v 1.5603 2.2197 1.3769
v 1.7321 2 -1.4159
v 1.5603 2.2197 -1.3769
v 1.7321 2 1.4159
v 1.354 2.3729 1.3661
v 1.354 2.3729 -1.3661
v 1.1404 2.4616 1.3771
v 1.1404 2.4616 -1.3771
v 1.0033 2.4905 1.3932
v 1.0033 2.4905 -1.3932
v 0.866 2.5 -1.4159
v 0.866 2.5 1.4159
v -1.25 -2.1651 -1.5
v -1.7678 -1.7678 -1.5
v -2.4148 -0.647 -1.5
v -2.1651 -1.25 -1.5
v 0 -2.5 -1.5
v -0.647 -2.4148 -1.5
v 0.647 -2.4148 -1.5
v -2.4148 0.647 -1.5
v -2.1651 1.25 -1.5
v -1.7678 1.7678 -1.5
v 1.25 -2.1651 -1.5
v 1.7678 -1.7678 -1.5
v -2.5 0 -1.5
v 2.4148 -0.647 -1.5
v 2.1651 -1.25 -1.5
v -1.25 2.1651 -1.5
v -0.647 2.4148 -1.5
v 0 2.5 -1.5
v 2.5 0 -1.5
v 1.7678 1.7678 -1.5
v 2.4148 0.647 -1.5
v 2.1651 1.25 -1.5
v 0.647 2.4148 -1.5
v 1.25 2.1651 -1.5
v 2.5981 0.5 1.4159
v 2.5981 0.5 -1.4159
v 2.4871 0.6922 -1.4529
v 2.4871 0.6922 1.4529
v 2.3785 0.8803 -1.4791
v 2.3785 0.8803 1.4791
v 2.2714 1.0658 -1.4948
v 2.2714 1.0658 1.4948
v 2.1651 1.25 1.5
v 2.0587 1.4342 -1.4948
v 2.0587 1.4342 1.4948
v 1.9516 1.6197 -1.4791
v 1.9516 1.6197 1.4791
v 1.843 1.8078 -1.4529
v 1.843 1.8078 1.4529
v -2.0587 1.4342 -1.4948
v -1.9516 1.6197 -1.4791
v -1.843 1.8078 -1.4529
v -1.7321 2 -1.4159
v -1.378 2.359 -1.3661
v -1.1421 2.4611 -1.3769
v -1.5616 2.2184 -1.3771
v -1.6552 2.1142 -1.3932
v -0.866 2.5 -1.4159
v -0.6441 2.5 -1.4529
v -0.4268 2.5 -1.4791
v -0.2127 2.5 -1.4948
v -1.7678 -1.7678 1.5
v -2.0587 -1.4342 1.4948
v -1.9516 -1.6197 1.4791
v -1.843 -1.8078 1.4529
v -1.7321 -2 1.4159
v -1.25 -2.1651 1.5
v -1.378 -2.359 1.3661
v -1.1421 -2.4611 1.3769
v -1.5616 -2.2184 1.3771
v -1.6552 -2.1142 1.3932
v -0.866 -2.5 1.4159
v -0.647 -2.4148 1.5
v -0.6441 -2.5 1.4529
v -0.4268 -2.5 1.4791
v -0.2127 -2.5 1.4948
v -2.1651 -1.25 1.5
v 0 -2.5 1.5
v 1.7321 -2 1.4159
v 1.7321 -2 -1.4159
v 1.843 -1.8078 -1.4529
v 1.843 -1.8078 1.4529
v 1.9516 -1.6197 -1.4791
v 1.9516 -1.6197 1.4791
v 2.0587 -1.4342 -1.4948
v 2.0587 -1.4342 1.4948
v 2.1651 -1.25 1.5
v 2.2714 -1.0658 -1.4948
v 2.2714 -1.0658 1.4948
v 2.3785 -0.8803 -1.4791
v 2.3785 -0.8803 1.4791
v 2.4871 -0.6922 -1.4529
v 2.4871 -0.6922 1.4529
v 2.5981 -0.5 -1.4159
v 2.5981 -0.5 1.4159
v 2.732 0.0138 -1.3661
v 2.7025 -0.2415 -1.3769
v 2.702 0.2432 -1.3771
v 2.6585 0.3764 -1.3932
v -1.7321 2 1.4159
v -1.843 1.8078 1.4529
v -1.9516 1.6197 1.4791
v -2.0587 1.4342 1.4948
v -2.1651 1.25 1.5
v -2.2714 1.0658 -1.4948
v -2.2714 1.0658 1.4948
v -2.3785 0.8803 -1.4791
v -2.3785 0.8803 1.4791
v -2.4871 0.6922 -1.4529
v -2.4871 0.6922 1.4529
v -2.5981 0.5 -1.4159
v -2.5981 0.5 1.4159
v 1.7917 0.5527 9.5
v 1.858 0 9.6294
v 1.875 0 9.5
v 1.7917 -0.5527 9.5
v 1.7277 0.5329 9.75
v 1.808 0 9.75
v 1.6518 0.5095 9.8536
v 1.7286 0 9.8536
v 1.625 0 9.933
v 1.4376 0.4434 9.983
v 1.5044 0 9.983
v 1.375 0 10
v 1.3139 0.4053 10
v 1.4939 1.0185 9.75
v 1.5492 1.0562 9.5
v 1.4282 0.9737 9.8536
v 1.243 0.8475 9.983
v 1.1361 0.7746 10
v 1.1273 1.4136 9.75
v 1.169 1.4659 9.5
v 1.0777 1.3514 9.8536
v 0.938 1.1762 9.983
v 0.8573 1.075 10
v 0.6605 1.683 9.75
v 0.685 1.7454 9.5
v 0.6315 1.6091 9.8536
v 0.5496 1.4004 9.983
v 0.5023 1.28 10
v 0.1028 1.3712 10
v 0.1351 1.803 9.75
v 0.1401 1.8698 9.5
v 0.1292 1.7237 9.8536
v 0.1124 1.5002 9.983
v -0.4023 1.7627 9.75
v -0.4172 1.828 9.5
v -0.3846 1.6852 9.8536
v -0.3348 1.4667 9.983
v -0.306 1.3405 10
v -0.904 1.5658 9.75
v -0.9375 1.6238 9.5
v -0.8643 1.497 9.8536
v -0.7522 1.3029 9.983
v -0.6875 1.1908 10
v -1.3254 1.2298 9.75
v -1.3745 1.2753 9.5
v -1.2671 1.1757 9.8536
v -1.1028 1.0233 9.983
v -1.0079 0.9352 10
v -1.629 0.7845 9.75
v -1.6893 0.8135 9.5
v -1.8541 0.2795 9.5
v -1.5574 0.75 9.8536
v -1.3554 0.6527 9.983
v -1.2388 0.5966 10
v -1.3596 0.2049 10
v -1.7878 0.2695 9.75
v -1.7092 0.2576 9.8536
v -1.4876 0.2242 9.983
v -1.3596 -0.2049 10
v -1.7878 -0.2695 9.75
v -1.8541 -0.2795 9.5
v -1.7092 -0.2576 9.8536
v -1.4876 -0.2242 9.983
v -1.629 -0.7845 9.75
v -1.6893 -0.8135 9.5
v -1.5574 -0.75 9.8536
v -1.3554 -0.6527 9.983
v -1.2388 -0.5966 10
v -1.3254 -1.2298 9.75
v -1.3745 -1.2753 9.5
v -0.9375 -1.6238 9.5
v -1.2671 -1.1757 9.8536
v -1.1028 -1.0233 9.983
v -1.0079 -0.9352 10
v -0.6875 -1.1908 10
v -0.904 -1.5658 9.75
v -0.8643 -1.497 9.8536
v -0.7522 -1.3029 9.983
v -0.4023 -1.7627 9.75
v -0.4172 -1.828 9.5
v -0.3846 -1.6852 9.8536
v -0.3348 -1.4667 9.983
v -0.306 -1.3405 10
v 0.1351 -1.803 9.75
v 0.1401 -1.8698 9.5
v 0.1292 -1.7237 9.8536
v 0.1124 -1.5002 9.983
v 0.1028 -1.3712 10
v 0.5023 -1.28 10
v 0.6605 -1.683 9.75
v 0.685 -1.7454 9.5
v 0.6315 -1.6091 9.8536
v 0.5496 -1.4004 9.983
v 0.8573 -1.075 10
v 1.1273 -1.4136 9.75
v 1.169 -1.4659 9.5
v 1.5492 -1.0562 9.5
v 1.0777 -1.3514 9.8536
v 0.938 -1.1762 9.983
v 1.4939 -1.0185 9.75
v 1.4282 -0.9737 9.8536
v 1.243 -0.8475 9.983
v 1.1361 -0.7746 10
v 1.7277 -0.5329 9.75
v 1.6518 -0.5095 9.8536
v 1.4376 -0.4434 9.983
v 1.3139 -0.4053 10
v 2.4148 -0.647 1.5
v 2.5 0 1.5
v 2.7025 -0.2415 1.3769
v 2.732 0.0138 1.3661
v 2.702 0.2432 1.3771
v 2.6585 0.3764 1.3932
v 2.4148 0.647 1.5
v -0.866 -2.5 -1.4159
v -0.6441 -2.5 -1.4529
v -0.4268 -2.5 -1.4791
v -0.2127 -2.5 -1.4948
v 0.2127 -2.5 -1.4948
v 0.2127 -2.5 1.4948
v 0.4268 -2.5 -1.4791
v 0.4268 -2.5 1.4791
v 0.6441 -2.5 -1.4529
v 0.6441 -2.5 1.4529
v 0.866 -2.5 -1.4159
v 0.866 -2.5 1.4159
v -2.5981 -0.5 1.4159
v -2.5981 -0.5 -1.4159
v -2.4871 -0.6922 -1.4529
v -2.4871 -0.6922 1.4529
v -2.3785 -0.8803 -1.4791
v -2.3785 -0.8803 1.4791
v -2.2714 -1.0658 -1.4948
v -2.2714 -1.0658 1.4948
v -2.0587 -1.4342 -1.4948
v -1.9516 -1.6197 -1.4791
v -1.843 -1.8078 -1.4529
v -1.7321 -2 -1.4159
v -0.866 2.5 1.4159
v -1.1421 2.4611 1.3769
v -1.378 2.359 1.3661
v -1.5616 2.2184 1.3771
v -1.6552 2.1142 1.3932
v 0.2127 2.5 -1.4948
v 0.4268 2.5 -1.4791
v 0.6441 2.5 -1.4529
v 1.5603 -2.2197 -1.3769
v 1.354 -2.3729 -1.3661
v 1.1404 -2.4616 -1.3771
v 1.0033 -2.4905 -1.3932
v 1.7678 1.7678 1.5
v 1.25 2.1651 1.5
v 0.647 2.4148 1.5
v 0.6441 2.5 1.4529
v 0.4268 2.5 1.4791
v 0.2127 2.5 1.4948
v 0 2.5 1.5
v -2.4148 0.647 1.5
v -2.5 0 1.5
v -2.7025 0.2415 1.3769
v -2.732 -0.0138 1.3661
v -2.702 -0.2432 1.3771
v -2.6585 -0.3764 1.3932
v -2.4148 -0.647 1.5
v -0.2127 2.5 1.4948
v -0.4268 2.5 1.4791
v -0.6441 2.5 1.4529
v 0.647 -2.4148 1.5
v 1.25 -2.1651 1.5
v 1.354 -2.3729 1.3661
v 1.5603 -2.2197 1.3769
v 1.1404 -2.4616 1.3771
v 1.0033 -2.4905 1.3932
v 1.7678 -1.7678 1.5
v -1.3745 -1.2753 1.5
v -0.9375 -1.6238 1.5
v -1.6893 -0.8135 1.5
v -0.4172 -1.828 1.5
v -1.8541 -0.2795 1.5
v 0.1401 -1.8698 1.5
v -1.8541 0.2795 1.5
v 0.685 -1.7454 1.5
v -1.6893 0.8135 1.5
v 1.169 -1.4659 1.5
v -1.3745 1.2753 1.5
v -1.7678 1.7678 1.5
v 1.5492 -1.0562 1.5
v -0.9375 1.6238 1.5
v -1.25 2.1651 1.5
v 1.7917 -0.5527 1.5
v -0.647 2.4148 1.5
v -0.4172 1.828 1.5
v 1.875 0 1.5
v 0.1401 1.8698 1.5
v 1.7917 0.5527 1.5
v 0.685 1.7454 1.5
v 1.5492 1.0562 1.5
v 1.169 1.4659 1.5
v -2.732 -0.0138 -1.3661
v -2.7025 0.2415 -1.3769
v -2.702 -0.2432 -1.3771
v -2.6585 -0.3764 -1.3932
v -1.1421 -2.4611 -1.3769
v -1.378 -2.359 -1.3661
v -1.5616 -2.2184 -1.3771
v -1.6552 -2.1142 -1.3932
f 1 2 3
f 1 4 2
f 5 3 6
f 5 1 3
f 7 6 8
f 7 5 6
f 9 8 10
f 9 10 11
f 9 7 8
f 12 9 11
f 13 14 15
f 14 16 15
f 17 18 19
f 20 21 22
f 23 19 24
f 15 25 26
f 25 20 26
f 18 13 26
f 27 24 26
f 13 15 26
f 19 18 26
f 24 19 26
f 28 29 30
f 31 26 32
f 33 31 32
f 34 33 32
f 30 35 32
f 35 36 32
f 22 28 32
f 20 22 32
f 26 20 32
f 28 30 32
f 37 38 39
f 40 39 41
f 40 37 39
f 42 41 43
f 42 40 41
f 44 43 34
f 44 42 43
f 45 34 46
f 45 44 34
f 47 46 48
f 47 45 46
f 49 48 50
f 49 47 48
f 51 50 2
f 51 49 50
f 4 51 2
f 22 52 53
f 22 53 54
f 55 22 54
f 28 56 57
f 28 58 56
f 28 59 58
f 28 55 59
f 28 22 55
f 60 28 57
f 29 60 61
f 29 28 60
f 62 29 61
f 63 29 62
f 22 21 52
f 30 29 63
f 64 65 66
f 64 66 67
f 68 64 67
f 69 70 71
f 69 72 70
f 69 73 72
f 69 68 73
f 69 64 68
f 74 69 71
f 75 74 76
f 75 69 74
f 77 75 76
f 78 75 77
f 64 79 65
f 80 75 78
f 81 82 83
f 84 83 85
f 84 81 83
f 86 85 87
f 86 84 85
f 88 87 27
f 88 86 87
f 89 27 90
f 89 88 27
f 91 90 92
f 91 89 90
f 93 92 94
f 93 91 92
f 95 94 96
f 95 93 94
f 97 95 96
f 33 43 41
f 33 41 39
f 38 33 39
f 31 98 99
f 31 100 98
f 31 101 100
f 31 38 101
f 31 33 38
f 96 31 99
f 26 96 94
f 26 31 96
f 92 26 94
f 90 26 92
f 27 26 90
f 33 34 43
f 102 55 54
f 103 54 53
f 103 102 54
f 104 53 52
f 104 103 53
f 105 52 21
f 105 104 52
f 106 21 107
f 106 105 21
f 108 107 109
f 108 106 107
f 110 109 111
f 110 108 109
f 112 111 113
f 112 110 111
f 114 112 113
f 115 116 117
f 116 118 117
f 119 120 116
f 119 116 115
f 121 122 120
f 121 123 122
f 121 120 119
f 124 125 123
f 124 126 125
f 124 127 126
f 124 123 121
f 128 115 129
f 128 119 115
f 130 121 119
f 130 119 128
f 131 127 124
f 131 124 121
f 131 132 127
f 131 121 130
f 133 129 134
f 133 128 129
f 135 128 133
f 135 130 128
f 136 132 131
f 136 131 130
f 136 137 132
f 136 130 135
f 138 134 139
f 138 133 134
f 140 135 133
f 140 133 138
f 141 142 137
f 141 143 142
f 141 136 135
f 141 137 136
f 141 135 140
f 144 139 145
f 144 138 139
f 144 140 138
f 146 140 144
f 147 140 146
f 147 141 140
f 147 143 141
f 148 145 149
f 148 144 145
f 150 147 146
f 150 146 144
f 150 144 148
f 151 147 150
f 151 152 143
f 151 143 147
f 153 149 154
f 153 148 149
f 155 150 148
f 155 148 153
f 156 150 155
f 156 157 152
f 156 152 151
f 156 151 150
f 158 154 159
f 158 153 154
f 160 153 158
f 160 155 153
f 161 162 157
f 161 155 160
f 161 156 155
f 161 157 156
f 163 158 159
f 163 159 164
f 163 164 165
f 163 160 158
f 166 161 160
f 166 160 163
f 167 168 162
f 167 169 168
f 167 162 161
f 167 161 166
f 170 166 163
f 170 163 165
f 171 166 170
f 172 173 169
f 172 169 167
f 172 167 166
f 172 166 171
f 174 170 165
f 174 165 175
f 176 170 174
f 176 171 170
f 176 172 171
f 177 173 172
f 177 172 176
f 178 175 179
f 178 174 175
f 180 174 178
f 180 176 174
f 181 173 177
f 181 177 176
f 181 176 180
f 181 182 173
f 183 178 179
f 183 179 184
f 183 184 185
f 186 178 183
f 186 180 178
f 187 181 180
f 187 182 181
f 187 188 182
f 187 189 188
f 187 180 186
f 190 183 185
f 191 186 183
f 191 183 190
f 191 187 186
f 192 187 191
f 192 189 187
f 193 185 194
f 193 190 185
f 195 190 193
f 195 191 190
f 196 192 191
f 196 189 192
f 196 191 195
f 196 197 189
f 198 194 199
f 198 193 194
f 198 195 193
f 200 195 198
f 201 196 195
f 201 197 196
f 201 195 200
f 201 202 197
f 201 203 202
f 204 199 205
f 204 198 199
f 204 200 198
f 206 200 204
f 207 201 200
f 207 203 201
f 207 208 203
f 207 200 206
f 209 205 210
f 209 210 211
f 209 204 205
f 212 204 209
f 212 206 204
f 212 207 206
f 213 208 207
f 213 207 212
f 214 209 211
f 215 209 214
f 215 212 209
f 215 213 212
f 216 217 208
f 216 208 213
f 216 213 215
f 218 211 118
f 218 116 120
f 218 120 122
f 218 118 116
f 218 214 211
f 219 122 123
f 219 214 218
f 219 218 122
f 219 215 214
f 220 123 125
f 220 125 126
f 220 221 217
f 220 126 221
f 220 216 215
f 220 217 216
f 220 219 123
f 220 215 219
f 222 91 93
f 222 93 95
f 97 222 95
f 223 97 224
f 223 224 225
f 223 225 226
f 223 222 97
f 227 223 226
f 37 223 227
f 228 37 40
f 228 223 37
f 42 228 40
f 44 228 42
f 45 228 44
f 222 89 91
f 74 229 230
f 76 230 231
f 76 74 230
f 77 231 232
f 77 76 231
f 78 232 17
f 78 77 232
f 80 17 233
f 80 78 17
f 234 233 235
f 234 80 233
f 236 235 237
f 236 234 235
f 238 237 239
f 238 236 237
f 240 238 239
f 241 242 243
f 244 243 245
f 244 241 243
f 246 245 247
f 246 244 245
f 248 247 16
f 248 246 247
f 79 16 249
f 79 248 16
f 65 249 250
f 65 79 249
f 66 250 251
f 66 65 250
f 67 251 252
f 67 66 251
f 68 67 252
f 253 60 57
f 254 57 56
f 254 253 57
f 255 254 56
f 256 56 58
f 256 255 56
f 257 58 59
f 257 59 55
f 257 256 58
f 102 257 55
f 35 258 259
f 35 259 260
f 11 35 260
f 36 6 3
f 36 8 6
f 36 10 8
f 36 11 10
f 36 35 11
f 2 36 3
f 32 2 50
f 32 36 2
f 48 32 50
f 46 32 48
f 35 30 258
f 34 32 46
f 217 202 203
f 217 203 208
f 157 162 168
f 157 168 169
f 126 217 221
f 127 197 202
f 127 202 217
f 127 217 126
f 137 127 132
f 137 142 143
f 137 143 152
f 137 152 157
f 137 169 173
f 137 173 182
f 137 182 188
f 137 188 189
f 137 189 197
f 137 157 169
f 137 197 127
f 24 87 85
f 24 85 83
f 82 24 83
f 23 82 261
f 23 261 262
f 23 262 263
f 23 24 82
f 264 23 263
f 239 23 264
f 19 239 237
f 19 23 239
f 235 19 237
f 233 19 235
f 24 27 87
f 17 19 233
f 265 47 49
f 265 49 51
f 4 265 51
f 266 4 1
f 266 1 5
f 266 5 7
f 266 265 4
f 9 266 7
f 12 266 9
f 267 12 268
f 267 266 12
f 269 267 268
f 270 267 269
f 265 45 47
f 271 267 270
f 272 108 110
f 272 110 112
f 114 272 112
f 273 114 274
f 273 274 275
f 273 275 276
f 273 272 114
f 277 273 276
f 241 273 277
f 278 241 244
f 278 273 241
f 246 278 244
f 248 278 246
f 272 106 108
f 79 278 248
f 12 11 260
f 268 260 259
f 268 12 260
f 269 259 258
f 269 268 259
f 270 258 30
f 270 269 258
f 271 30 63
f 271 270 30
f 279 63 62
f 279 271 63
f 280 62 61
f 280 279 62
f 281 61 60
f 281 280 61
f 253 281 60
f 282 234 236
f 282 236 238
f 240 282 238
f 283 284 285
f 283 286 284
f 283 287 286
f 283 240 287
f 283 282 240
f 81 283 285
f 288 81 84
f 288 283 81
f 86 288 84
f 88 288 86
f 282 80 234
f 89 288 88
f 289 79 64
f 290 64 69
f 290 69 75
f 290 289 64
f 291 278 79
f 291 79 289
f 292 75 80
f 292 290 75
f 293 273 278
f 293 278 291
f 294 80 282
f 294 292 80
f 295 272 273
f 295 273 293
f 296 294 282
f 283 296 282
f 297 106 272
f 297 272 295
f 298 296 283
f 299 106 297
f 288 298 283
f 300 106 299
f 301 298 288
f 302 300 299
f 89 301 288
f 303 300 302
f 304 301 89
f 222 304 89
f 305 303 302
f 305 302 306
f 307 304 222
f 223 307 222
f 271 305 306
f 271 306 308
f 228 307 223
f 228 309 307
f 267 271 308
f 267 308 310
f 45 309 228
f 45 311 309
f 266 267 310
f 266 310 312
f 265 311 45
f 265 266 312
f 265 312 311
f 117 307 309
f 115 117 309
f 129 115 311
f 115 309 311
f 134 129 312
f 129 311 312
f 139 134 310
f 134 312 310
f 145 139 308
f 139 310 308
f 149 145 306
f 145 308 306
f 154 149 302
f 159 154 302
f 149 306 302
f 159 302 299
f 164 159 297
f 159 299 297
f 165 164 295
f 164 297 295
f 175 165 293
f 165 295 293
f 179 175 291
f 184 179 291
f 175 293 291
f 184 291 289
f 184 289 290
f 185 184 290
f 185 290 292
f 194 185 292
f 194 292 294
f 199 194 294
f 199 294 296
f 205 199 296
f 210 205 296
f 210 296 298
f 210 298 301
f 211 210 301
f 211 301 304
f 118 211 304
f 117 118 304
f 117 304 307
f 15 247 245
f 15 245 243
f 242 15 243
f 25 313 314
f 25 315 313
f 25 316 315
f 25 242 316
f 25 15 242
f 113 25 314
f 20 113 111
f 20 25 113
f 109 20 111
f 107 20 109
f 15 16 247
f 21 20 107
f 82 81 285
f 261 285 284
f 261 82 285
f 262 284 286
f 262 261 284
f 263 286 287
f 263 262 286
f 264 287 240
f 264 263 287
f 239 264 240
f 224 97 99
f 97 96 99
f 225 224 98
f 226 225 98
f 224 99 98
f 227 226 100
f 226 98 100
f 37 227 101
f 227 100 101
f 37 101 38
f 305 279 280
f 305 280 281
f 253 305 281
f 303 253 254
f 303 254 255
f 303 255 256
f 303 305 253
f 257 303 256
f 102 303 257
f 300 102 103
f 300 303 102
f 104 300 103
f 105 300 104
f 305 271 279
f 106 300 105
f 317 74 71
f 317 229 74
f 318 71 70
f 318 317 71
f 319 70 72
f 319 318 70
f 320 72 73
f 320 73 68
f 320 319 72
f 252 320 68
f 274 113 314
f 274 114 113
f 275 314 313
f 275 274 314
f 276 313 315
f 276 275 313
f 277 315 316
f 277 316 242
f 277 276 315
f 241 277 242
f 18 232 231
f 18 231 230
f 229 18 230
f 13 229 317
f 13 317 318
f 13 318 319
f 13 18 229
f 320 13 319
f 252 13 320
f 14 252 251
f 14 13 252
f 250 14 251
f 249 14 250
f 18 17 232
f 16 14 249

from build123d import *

# Parameters (mm, degrees)
BOSS_EXTRUDE2_DEPTH     = 1.5
SKETCH5_OUTSIDE_W       = 61.376
SKETCH5_OUTSIDE_H       = 60.602
SKETCH5_OUTSIDE_R       = 2.5
CUT_EXTRUDE1_DEPTH      = 15
CUT_EXTRUDE1_DRAFT      = -60
MIRROR1_COPY_1_SKETCH_W = 61.376
MIRROR1_COPY_1_SKETCH_H = 60.602
MIRROR1_COPY_1_SKETCH_R = 2.5
MIRROR1_COPY_1_DEPTH    = 15
MIRROR1_COPY_1_DRAFT    = -60
SKETCH4_3_R             = 1.875
BOSS_EXTRUDE3_DEPTH     = 10
FILLET1_R               = 1
FILLET2_R               = 0.5


with BuildPart() as part:
    # Sketch4 → Boss-Extrude2 (new, symmetric)
    with BuildSketch(Plane.XY):
        Polygon((1.443375673, 2.5), (-1.443375673, 2.5), (-2.886751346, 0), (-1.443375673, -2.5), (1.443375673, -2.5), (2.886751346, 0), align=None)
    extrude(amount=BOSS_EXTRUDE2_DEPTH, both=True)


with BuildPart() as cut_extrude1_tool:
    # Sketch5 outside → Cut-Extrude1 (with draft: the straight prism first)
    with BuildSketch(Plane.XY.offset(1.5)):
        Rectangle(SKETCH5_OUTSIDE_W, SKETCH5_OUTSIDE_H)
        Circle(SKETCH5_OUTSIDE_R, mode=Mode.SUBTRACT)
    extrude(amount=-CUT_EXTRUDE1_DEPTH)
    # Cut-Extrude1: the draft: its side faces are tilted about the plane it starts from
    cut_extrude1_sides = [cut_extrude1_tool.faces().sort_by_distance(p)[0] for p in [
        (0, -30.301, -6),
        (30.688, 0, -6),
        (0, 30.301, -6),
        (-30.688, 0, -6),
        (-2.5, 0, -6),
    ]]
    draft(cut_extrude1_sides, Plane.XY.offset(1.5), CUT_EXTRUDE1_DRAFT)


with BuildPart() as part_1:
    add(part.part)

    # Cut-Extrude1: cut by cut_extrude1_tool
    add(cut_extrude1_tool.part, mode=Mode.SUBTRACT)


with BuildPart() as mirror1_copy_1_tool:
    # Mirror1 copy 1 sketch → Mirror1 copy 1 (with draft: the straight prism first)
    with BuildSketch(Plane(origin=(0, 0, -1.5), x_dir=(1, 0, 0), z_dir=(0, 0, -1))):
        Rectangle(MIRROR1_COPY_1_SKETCH_W, MIRROR1_COPY_1_SKETCH_H)
        Circle(MIRROR1_COPY_1_SKETCH_R, mode=Mode.SUBTRACT)
    extrude(amount=-MIRROR1_COPY_1_DEPTH)
    # Mirror1 copy 1: the draft: its side faces are tilted about the plane it starts from
    mirror1_copy_1_sides = [mirror1_copy_1_tool.faces().sort_by_distance(p)[0] for p in [
        (0, -30.301, 6),
        (30.688, 0, 6),
        (0, 30.301, 6),
        (-30.688, 0, 6),
        (-2.5, 0, 6),
    ]]
    draft(mirror1_copy_1_sides, Plane(origin=(0, 0, -1.5), x_dir=(1, 0, 0), z_dir=(0, 0, -1)), MIRROR1_COPY_1_DRAFT)


with BuildPart() as part_2:
    add(part_1.part)

    # Mirror1 copy 1: cut by mirror1_copy_1_tool
    add(mirror1_copy_1_tool.part, mode=Mode.SUBTRACT)

    # Sketch4<3> → Boss-Extrude3 (add)
    with BuildSketch(Plane.XY):
        Circle(SKETCH4_3_R)
    extrude(amount=BOSS_EXTRUDE3_DEPTH)

    # Fillet1
    fillet1_edges = [part_2.edges().sort_by_distance(p)[0] for p in [
        (2.886751346, 0, 0),
        (1.443375673, -2.5, 0),
        (-1.443375673, -2.5, 0),
        (-2.886751346, 0, 0),
        (-1.443375673, 2.5, 0),
        (1.443375673, 2.5, 0),
    ]]
    fillet(fillet1_edges, radius=FILLET1_R)

    # Fillet2
    fillet2_edges = [part_2.edges().sort_by_distance(p)[0] for p in [
        (-1.875, 0, 10),
    ]]
    fillet(fillet2_edges, radius=FILLET2_R)


solid = part_2.part
